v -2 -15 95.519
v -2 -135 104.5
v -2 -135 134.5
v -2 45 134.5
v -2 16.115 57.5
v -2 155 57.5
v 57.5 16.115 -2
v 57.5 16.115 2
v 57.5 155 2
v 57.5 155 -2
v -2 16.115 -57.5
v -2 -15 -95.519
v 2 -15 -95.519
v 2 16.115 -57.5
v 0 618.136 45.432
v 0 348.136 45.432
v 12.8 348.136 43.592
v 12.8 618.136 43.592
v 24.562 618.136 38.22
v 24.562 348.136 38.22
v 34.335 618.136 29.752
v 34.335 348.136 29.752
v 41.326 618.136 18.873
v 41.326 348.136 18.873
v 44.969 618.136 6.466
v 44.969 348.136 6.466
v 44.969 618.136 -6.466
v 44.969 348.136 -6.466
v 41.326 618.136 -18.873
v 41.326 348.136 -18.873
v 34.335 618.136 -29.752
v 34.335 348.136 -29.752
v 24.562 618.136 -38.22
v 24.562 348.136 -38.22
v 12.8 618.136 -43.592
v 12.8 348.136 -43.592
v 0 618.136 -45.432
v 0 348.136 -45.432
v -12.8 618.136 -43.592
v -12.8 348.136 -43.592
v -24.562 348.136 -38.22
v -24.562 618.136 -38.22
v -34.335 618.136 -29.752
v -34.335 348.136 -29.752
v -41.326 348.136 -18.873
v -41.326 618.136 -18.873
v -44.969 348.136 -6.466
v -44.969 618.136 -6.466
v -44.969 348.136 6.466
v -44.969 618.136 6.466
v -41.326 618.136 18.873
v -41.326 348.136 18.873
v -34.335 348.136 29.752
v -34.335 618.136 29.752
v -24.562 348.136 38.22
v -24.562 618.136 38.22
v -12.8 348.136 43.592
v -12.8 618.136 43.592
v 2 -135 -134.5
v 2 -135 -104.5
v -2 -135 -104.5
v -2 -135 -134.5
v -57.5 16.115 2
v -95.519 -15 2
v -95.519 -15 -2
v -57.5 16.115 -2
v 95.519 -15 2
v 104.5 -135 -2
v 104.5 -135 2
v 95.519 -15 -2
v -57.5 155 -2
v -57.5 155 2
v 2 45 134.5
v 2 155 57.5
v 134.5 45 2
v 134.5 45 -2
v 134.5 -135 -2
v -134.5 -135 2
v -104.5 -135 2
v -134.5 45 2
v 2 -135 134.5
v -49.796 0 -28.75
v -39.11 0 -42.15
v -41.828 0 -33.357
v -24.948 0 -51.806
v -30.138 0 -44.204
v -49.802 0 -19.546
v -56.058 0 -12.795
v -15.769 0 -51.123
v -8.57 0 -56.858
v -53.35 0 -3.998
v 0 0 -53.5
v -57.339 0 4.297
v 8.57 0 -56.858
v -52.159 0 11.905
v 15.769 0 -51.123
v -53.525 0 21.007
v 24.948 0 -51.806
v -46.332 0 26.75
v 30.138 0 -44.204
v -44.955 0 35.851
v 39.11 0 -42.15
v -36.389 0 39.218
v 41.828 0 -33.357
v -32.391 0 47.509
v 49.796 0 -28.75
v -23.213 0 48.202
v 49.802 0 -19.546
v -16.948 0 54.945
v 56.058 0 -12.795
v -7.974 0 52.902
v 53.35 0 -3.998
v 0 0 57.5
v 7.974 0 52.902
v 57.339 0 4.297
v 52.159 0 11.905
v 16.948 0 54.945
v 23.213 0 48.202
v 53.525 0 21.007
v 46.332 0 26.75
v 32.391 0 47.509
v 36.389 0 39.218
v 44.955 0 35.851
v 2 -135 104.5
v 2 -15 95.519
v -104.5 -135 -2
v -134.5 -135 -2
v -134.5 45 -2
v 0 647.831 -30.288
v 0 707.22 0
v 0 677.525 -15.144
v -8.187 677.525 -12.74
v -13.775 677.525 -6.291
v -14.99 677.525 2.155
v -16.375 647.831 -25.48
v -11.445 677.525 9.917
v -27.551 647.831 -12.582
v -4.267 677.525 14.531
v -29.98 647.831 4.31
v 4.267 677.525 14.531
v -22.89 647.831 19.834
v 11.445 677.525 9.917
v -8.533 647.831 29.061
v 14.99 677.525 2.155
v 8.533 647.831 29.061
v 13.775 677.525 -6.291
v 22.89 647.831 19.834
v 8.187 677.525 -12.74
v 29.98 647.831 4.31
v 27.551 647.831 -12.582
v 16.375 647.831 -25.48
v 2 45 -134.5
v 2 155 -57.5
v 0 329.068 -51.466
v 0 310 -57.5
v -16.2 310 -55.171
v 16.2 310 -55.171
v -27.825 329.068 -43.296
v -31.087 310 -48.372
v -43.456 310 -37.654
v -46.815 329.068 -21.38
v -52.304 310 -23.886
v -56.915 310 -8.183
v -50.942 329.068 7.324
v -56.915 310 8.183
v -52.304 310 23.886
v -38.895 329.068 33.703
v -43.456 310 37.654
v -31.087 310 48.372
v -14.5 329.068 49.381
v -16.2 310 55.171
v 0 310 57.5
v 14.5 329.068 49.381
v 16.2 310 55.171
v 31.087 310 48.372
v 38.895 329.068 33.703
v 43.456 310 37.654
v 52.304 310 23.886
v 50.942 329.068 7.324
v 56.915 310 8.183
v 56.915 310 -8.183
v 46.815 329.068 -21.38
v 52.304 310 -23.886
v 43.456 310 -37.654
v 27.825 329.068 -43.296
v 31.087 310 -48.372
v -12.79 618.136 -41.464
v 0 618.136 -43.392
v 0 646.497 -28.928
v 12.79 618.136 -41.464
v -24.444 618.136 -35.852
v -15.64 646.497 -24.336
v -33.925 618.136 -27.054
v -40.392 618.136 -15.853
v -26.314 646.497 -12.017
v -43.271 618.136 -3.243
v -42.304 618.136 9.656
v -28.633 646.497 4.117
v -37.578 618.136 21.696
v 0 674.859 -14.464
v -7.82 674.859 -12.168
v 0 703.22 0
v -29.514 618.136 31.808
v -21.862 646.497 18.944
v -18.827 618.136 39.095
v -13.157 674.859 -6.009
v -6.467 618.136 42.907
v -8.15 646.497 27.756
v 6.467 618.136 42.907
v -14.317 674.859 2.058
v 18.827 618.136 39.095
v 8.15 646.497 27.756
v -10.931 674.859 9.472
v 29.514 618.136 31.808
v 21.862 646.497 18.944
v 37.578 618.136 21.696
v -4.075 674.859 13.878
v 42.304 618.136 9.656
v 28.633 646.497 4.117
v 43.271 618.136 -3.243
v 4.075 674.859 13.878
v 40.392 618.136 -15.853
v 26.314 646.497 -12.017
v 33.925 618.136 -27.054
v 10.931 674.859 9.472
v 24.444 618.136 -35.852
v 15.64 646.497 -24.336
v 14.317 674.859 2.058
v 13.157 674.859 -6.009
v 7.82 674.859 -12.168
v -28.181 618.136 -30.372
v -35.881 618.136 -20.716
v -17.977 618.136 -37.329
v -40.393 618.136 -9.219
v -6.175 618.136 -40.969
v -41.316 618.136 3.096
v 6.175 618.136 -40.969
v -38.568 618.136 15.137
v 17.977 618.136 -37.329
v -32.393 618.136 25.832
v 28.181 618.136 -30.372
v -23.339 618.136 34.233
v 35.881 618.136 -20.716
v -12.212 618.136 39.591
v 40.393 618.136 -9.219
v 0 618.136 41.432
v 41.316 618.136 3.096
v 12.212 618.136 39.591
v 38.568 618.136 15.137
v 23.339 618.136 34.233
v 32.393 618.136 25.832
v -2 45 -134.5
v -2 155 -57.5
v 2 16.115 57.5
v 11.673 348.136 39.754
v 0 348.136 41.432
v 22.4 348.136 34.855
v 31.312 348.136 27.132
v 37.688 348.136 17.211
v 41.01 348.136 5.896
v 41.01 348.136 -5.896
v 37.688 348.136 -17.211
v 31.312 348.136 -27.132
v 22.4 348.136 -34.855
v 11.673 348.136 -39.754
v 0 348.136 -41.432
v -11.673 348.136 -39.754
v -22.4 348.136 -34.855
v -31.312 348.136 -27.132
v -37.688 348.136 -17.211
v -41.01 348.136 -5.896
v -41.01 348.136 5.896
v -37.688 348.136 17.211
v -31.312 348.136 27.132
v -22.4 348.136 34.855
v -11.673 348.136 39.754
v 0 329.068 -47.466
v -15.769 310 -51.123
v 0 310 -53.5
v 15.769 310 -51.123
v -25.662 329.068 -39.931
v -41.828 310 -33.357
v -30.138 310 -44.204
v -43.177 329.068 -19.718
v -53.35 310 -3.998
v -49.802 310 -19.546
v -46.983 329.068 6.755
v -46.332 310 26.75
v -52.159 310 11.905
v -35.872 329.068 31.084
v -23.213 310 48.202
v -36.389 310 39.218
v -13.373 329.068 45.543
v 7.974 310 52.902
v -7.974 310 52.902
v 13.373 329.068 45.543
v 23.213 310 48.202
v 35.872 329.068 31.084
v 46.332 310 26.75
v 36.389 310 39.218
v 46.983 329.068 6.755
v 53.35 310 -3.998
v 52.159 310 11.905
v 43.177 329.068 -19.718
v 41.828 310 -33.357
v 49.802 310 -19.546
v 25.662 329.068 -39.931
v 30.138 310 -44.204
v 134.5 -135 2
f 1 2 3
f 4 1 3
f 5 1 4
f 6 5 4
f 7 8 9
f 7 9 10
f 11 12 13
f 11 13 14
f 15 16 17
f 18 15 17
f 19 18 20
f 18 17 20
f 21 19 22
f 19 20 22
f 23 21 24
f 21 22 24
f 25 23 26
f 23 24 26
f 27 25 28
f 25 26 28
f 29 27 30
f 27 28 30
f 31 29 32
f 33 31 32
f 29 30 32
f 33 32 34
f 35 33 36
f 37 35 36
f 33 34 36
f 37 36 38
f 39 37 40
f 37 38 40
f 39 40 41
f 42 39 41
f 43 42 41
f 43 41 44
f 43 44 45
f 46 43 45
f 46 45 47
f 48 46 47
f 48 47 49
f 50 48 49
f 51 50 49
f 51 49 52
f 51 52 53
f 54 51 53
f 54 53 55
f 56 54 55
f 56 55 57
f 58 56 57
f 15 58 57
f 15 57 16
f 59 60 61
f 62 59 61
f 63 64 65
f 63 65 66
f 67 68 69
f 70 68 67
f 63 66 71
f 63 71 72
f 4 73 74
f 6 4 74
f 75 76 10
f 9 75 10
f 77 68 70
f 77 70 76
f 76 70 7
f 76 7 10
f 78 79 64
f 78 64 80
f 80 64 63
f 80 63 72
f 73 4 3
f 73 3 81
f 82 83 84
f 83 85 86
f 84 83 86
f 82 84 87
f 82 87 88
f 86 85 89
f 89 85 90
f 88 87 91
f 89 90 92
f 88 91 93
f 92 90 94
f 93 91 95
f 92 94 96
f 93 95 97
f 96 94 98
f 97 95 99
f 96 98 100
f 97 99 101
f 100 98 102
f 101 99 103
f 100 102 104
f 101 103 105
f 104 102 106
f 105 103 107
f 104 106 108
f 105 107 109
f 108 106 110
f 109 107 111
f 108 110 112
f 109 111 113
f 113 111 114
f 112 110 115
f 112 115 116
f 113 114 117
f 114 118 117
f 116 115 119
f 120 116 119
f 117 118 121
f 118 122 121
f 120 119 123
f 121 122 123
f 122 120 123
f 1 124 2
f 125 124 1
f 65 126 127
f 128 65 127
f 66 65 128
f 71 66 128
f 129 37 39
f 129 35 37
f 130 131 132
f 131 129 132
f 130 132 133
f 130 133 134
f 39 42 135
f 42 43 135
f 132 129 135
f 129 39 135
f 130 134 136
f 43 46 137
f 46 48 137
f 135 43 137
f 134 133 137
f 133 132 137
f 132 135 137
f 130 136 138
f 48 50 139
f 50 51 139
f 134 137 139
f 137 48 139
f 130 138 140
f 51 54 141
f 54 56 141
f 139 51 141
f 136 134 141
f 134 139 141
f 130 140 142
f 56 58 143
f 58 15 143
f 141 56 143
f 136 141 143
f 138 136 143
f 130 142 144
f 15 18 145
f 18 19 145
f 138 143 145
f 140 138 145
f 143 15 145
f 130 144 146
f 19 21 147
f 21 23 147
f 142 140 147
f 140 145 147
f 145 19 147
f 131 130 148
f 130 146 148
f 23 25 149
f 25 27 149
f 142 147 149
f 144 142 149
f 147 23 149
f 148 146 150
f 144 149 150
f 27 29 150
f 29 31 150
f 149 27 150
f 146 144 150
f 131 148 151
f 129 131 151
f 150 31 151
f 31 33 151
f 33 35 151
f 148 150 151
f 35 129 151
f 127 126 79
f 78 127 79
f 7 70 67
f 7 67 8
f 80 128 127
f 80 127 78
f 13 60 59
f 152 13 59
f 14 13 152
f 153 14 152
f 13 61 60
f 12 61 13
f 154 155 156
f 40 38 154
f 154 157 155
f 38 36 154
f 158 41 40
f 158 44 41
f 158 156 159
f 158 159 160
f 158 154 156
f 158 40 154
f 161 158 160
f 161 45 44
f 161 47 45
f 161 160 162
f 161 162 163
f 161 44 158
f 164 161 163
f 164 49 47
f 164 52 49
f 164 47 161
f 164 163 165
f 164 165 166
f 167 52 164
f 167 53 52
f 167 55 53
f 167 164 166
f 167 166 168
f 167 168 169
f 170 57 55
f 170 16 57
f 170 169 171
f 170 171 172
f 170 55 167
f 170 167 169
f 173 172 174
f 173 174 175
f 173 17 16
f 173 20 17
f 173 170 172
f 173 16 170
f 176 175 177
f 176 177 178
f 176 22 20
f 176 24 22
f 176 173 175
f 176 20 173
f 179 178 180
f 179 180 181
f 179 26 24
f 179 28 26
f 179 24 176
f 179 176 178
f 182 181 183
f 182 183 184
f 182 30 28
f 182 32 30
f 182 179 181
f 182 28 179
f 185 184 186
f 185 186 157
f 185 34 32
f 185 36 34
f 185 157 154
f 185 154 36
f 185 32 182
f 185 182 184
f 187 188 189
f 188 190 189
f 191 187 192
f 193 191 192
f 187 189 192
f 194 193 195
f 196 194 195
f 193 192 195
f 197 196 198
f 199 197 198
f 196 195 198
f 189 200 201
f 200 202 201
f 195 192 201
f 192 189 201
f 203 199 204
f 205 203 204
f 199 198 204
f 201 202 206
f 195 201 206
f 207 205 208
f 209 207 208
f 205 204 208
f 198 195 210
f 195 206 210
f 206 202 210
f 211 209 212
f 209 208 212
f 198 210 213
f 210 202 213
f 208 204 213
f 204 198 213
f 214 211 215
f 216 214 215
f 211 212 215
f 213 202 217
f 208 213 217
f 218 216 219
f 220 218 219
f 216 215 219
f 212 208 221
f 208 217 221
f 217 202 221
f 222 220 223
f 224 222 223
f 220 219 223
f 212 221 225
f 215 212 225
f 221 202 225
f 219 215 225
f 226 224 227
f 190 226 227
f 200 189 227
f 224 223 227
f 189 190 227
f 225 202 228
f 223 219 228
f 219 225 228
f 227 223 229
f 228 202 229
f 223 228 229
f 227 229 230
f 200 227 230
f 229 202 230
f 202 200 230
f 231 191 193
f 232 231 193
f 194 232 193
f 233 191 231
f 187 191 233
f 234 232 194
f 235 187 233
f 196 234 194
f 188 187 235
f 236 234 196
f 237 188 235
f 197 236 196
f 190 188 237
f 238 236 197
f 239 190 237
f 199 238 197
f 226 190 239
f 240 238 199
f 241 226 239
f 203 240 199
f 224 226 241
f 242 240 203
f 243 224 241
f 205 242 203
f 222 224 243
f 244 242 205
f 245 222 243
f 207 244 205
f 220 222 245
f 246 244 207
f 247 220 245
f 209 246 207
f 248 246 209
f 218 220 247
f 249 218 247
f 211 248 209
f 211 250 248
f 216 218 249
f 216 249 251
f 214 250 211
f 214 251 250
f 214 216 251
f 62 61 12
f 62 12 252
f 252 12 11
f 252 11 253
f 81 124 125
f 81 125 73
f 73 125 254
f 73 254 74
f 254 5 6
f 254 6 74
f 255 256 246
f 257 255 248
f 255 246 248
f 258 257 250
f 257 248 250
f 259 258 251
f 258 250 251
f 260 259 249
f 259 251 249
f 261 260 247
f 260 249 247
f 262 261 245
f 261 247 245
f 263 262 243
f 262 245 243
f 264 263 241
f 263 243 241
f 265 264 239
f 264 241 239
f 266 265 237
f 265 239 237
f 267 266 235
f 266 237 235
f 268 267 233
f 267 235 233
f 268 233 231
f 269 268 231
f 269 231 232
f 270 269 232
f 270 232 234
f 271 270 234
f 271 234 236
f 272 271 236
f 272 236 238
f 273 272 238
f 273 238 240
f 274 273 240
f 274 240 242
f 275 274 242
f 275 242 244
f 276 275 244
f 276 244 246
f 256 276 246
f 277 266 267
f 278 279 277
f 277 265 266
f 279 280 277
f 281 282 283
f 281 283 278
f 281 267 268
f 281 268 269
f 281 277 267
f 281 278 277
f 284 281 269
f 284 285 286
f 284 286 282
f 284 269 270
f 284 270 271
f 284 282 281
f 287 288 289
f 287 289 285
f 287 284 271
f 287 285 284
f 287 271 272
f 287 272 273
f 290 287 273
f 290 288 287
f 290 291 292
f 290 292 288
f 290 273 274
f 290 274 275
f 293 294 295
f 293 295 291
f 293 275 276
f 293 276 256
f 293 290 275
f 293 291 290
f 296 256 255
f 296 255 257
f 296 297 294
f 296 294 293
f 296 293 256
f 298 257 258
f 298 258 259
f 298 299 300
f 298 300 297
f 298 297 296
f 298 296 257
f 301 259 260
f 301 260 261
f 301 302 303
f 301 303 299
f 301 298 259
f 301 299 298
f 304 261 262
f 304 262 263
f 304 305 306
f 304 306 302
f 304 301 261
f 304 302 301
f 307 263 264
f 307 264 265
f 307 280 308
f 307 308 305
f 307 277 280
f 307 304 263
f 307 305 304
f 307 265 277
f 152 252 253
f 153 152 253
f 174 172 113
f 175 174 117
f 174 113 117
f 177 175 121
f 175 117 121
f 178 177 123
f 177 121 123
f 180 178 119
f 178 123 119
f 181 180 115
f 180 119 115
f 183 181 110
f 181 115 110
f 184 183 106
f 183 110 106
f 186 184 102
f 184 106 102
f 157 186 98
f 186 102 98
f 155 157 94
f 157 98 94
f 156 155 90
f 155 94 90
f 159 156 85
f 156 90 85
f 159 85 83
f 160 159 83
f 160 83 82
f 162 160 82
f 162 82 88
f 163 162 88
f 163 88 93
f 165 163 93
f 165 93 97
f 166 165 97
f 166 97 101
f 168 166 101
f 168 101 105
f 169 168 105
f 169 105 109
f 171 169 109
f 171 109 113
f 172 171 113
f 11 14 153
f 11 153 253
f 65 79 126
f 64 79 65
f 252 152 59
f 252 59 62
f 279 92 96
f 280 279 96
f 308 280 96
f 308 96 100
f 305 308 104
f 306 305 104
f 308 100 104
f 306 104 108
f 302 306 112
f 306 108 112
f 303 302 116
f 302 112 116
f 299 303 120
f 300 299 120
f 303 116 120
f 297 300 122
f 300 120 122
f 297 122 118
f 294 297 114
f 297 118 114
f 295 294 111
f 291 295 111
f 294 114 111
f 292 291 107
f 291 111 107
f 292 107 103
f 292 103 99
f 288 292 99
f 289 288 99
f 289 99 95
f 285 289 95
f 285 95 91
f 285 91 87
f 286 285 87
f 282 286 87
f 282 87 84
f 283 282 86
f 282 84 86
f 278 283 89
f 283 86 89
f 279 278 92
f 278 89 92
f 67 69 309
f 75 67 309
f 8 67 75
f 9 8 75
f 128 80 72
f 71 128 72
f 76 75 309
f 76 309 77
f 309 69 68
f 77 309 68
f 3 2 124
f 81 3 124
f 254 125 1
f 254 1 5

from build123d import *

# Parameters (mm, degrees)
CROQUIS1_R              = 57.5
SALIENTE_EXTRUIR1_DEPTH = 310
CROQUIS3_R              = 53.5
CORTAR_EXTRUIR1_DEPTH   = 310
CROQUIS5_R              = 45.431810566
SALIENTE_EXTRUIR2_DEPTH = 270
CROQUIS6_R              = 41.431810566
CORTAR_EXTRUIR2_DEPTH   = 270
CROQUIS8_W              = 4
CROQUIS8_H              = 290
SALIENTE_EXTRUIR3_DEPTH = 77
CORTAR_EXTRUIR3_DEPTH   = 77
MATRIZC3_COUNT          = 4


with BuildPart() as part:
    # Croquis1 → Saliente-Extruir1 (new body)
    with BuildSketch(Plane(origin=(0, 0, 0), x_dir=(1, 0, 0), z_dir=(0, 1, 0))):
        with Locations(Location((0, 0, 0), (0, 0, 270))):
            Circle(CROQUIS1_R)
    extrude(amount=SALIENTE_EXTRUIR1_DEPTH)

    # Croquis3 → Cortar-Extruir1 (cut)
    with BuildSketch(Plane.XZ):
        with Locations(Location((0, 0, 0), (0, 0, 270))):
            Circle(CROQUIS3_R)
    extrude(amount=-CORTAR_EXTRUIR1_DEPTH, mode=Mode.SUBTRACT)

    # Croquis4 → Revolución1 (revolve)
    with BuildSketch(Plane.XY, mode=Mode.PRIVATE) as revoluci_n1_sk:
        Polygon((53.5, 310), (57.5, 310), (45.431810566, 348.136056479), (41.431810566, 348.136056479), align=None)
    revolve(revoluci_n1_sk.sketch.rotate(Axis((0, 0, 0), (0, 1, 0)), 90), axis=Axis((0, 0, 0), (0, 1, 0)))

    # Croquis5 → Saliente-Extruir2 (add)
    with BuildSketch(Plane(origin=(0, 348.136056479, 0), x_dir=(1, 0, 0), z_dir=(0, 1, 0))):
        with Locations(Location((0, 0, 0), (0, 0, 270))):
            Circle(CROQUIS5_R)
    extrude(amount=SALIENTE_EXTRUIR2_DEPTH)

    # Croquis6 → Cortar-Extruir2 (cut)
    with BuildSketch(Plane(origin=(0, 618.136056479, 0), x_dir=(1, 0, 0), z_dir=(0, 1, 0))):
        with Locations(Location((0, 0, 0), (0, 0, 270))):
            Circle(CROQUIS6_R)
    extrude(amount=-CORTAR_EXTRUIR2_DEPTH, mode=Mode.SUBTRACT)

    # Croquis7 → Revolución2 (revolve)
    with BuildSketch(Plane.XY, mode=Mode.PRIVATE) as revoluci_n2_sk:
        Polygon((0, 707.220008955), (45.431810566, 618.136056479), (43.391855701, 618.136056479), (0, 703.220008955), align=None)
    revolve(revoluci_n2_sk.sketch.rotate(Axis((0, 0, 0), (0, 1, 0)), 90), axis=Axis((0, 0, 0), (0, 1, 0)))


with BuildPart() as body_2:
    # Croquis8 → Saliente-Extruir3 (new body)
    with BuildSketch(Plane(origin=(57.5, 0, 0), x_dir=(0, 0, -1), z_dir=(1, 0, 0))):
        with Locations((0, 10)):
            Rectangle(CROQUIS8_W, CROQUIS8_H)
    extrude(amount=SALIENTE_EXTRUIR3_DEPTH)

    # Croquis10 → Cortar-Extruir3 (cut)
    with BuildSketch(Plane(origin=(0, 0, -2), x_dir=(-1, 0, 0), z_dir=(0, 0, -1))):
        Polygon((-104.5, -135), (-95.519360765, -15), (-57.5, 16.115270239), (-57.5, -135), align=None)
        Polygon((-57.5, 155), (-134.5, 155), (-134.5, 45), align=None)
    extrude(amount=-CORTAR_EXTRUIR3_DEPTH, mode=Mode.SUBTRACT)


with BuildPart() as matrizc3_1:
    # MatrizC3: pattern copy
    add(body_2.part.rotate(Axis((0, 0, 0), (0, 1, 0)), 1 * 360 / MATRIZC3_COUNT))


with BuildPart() as matrizc3_2:
    # MatrizC3: pattern copy
    add(body_2.part.rotate(Axis((0, 0, 0), (0, 1, 0)), 2 * 360 / MATRIZC3_COUNT))


with BuildPart() as matrizc3_3:
    # MatrizC3: pattern copy
    add(body_2.part.rotate(Axis((0, 0, 0), (0, 1, 0)), 3 * 360 / MATRIZC3_COUNT))


solid = Compound([part.part, body_2.part, matrizc3_1.part, matrizc3_2.part, matrizc3_3.part])
